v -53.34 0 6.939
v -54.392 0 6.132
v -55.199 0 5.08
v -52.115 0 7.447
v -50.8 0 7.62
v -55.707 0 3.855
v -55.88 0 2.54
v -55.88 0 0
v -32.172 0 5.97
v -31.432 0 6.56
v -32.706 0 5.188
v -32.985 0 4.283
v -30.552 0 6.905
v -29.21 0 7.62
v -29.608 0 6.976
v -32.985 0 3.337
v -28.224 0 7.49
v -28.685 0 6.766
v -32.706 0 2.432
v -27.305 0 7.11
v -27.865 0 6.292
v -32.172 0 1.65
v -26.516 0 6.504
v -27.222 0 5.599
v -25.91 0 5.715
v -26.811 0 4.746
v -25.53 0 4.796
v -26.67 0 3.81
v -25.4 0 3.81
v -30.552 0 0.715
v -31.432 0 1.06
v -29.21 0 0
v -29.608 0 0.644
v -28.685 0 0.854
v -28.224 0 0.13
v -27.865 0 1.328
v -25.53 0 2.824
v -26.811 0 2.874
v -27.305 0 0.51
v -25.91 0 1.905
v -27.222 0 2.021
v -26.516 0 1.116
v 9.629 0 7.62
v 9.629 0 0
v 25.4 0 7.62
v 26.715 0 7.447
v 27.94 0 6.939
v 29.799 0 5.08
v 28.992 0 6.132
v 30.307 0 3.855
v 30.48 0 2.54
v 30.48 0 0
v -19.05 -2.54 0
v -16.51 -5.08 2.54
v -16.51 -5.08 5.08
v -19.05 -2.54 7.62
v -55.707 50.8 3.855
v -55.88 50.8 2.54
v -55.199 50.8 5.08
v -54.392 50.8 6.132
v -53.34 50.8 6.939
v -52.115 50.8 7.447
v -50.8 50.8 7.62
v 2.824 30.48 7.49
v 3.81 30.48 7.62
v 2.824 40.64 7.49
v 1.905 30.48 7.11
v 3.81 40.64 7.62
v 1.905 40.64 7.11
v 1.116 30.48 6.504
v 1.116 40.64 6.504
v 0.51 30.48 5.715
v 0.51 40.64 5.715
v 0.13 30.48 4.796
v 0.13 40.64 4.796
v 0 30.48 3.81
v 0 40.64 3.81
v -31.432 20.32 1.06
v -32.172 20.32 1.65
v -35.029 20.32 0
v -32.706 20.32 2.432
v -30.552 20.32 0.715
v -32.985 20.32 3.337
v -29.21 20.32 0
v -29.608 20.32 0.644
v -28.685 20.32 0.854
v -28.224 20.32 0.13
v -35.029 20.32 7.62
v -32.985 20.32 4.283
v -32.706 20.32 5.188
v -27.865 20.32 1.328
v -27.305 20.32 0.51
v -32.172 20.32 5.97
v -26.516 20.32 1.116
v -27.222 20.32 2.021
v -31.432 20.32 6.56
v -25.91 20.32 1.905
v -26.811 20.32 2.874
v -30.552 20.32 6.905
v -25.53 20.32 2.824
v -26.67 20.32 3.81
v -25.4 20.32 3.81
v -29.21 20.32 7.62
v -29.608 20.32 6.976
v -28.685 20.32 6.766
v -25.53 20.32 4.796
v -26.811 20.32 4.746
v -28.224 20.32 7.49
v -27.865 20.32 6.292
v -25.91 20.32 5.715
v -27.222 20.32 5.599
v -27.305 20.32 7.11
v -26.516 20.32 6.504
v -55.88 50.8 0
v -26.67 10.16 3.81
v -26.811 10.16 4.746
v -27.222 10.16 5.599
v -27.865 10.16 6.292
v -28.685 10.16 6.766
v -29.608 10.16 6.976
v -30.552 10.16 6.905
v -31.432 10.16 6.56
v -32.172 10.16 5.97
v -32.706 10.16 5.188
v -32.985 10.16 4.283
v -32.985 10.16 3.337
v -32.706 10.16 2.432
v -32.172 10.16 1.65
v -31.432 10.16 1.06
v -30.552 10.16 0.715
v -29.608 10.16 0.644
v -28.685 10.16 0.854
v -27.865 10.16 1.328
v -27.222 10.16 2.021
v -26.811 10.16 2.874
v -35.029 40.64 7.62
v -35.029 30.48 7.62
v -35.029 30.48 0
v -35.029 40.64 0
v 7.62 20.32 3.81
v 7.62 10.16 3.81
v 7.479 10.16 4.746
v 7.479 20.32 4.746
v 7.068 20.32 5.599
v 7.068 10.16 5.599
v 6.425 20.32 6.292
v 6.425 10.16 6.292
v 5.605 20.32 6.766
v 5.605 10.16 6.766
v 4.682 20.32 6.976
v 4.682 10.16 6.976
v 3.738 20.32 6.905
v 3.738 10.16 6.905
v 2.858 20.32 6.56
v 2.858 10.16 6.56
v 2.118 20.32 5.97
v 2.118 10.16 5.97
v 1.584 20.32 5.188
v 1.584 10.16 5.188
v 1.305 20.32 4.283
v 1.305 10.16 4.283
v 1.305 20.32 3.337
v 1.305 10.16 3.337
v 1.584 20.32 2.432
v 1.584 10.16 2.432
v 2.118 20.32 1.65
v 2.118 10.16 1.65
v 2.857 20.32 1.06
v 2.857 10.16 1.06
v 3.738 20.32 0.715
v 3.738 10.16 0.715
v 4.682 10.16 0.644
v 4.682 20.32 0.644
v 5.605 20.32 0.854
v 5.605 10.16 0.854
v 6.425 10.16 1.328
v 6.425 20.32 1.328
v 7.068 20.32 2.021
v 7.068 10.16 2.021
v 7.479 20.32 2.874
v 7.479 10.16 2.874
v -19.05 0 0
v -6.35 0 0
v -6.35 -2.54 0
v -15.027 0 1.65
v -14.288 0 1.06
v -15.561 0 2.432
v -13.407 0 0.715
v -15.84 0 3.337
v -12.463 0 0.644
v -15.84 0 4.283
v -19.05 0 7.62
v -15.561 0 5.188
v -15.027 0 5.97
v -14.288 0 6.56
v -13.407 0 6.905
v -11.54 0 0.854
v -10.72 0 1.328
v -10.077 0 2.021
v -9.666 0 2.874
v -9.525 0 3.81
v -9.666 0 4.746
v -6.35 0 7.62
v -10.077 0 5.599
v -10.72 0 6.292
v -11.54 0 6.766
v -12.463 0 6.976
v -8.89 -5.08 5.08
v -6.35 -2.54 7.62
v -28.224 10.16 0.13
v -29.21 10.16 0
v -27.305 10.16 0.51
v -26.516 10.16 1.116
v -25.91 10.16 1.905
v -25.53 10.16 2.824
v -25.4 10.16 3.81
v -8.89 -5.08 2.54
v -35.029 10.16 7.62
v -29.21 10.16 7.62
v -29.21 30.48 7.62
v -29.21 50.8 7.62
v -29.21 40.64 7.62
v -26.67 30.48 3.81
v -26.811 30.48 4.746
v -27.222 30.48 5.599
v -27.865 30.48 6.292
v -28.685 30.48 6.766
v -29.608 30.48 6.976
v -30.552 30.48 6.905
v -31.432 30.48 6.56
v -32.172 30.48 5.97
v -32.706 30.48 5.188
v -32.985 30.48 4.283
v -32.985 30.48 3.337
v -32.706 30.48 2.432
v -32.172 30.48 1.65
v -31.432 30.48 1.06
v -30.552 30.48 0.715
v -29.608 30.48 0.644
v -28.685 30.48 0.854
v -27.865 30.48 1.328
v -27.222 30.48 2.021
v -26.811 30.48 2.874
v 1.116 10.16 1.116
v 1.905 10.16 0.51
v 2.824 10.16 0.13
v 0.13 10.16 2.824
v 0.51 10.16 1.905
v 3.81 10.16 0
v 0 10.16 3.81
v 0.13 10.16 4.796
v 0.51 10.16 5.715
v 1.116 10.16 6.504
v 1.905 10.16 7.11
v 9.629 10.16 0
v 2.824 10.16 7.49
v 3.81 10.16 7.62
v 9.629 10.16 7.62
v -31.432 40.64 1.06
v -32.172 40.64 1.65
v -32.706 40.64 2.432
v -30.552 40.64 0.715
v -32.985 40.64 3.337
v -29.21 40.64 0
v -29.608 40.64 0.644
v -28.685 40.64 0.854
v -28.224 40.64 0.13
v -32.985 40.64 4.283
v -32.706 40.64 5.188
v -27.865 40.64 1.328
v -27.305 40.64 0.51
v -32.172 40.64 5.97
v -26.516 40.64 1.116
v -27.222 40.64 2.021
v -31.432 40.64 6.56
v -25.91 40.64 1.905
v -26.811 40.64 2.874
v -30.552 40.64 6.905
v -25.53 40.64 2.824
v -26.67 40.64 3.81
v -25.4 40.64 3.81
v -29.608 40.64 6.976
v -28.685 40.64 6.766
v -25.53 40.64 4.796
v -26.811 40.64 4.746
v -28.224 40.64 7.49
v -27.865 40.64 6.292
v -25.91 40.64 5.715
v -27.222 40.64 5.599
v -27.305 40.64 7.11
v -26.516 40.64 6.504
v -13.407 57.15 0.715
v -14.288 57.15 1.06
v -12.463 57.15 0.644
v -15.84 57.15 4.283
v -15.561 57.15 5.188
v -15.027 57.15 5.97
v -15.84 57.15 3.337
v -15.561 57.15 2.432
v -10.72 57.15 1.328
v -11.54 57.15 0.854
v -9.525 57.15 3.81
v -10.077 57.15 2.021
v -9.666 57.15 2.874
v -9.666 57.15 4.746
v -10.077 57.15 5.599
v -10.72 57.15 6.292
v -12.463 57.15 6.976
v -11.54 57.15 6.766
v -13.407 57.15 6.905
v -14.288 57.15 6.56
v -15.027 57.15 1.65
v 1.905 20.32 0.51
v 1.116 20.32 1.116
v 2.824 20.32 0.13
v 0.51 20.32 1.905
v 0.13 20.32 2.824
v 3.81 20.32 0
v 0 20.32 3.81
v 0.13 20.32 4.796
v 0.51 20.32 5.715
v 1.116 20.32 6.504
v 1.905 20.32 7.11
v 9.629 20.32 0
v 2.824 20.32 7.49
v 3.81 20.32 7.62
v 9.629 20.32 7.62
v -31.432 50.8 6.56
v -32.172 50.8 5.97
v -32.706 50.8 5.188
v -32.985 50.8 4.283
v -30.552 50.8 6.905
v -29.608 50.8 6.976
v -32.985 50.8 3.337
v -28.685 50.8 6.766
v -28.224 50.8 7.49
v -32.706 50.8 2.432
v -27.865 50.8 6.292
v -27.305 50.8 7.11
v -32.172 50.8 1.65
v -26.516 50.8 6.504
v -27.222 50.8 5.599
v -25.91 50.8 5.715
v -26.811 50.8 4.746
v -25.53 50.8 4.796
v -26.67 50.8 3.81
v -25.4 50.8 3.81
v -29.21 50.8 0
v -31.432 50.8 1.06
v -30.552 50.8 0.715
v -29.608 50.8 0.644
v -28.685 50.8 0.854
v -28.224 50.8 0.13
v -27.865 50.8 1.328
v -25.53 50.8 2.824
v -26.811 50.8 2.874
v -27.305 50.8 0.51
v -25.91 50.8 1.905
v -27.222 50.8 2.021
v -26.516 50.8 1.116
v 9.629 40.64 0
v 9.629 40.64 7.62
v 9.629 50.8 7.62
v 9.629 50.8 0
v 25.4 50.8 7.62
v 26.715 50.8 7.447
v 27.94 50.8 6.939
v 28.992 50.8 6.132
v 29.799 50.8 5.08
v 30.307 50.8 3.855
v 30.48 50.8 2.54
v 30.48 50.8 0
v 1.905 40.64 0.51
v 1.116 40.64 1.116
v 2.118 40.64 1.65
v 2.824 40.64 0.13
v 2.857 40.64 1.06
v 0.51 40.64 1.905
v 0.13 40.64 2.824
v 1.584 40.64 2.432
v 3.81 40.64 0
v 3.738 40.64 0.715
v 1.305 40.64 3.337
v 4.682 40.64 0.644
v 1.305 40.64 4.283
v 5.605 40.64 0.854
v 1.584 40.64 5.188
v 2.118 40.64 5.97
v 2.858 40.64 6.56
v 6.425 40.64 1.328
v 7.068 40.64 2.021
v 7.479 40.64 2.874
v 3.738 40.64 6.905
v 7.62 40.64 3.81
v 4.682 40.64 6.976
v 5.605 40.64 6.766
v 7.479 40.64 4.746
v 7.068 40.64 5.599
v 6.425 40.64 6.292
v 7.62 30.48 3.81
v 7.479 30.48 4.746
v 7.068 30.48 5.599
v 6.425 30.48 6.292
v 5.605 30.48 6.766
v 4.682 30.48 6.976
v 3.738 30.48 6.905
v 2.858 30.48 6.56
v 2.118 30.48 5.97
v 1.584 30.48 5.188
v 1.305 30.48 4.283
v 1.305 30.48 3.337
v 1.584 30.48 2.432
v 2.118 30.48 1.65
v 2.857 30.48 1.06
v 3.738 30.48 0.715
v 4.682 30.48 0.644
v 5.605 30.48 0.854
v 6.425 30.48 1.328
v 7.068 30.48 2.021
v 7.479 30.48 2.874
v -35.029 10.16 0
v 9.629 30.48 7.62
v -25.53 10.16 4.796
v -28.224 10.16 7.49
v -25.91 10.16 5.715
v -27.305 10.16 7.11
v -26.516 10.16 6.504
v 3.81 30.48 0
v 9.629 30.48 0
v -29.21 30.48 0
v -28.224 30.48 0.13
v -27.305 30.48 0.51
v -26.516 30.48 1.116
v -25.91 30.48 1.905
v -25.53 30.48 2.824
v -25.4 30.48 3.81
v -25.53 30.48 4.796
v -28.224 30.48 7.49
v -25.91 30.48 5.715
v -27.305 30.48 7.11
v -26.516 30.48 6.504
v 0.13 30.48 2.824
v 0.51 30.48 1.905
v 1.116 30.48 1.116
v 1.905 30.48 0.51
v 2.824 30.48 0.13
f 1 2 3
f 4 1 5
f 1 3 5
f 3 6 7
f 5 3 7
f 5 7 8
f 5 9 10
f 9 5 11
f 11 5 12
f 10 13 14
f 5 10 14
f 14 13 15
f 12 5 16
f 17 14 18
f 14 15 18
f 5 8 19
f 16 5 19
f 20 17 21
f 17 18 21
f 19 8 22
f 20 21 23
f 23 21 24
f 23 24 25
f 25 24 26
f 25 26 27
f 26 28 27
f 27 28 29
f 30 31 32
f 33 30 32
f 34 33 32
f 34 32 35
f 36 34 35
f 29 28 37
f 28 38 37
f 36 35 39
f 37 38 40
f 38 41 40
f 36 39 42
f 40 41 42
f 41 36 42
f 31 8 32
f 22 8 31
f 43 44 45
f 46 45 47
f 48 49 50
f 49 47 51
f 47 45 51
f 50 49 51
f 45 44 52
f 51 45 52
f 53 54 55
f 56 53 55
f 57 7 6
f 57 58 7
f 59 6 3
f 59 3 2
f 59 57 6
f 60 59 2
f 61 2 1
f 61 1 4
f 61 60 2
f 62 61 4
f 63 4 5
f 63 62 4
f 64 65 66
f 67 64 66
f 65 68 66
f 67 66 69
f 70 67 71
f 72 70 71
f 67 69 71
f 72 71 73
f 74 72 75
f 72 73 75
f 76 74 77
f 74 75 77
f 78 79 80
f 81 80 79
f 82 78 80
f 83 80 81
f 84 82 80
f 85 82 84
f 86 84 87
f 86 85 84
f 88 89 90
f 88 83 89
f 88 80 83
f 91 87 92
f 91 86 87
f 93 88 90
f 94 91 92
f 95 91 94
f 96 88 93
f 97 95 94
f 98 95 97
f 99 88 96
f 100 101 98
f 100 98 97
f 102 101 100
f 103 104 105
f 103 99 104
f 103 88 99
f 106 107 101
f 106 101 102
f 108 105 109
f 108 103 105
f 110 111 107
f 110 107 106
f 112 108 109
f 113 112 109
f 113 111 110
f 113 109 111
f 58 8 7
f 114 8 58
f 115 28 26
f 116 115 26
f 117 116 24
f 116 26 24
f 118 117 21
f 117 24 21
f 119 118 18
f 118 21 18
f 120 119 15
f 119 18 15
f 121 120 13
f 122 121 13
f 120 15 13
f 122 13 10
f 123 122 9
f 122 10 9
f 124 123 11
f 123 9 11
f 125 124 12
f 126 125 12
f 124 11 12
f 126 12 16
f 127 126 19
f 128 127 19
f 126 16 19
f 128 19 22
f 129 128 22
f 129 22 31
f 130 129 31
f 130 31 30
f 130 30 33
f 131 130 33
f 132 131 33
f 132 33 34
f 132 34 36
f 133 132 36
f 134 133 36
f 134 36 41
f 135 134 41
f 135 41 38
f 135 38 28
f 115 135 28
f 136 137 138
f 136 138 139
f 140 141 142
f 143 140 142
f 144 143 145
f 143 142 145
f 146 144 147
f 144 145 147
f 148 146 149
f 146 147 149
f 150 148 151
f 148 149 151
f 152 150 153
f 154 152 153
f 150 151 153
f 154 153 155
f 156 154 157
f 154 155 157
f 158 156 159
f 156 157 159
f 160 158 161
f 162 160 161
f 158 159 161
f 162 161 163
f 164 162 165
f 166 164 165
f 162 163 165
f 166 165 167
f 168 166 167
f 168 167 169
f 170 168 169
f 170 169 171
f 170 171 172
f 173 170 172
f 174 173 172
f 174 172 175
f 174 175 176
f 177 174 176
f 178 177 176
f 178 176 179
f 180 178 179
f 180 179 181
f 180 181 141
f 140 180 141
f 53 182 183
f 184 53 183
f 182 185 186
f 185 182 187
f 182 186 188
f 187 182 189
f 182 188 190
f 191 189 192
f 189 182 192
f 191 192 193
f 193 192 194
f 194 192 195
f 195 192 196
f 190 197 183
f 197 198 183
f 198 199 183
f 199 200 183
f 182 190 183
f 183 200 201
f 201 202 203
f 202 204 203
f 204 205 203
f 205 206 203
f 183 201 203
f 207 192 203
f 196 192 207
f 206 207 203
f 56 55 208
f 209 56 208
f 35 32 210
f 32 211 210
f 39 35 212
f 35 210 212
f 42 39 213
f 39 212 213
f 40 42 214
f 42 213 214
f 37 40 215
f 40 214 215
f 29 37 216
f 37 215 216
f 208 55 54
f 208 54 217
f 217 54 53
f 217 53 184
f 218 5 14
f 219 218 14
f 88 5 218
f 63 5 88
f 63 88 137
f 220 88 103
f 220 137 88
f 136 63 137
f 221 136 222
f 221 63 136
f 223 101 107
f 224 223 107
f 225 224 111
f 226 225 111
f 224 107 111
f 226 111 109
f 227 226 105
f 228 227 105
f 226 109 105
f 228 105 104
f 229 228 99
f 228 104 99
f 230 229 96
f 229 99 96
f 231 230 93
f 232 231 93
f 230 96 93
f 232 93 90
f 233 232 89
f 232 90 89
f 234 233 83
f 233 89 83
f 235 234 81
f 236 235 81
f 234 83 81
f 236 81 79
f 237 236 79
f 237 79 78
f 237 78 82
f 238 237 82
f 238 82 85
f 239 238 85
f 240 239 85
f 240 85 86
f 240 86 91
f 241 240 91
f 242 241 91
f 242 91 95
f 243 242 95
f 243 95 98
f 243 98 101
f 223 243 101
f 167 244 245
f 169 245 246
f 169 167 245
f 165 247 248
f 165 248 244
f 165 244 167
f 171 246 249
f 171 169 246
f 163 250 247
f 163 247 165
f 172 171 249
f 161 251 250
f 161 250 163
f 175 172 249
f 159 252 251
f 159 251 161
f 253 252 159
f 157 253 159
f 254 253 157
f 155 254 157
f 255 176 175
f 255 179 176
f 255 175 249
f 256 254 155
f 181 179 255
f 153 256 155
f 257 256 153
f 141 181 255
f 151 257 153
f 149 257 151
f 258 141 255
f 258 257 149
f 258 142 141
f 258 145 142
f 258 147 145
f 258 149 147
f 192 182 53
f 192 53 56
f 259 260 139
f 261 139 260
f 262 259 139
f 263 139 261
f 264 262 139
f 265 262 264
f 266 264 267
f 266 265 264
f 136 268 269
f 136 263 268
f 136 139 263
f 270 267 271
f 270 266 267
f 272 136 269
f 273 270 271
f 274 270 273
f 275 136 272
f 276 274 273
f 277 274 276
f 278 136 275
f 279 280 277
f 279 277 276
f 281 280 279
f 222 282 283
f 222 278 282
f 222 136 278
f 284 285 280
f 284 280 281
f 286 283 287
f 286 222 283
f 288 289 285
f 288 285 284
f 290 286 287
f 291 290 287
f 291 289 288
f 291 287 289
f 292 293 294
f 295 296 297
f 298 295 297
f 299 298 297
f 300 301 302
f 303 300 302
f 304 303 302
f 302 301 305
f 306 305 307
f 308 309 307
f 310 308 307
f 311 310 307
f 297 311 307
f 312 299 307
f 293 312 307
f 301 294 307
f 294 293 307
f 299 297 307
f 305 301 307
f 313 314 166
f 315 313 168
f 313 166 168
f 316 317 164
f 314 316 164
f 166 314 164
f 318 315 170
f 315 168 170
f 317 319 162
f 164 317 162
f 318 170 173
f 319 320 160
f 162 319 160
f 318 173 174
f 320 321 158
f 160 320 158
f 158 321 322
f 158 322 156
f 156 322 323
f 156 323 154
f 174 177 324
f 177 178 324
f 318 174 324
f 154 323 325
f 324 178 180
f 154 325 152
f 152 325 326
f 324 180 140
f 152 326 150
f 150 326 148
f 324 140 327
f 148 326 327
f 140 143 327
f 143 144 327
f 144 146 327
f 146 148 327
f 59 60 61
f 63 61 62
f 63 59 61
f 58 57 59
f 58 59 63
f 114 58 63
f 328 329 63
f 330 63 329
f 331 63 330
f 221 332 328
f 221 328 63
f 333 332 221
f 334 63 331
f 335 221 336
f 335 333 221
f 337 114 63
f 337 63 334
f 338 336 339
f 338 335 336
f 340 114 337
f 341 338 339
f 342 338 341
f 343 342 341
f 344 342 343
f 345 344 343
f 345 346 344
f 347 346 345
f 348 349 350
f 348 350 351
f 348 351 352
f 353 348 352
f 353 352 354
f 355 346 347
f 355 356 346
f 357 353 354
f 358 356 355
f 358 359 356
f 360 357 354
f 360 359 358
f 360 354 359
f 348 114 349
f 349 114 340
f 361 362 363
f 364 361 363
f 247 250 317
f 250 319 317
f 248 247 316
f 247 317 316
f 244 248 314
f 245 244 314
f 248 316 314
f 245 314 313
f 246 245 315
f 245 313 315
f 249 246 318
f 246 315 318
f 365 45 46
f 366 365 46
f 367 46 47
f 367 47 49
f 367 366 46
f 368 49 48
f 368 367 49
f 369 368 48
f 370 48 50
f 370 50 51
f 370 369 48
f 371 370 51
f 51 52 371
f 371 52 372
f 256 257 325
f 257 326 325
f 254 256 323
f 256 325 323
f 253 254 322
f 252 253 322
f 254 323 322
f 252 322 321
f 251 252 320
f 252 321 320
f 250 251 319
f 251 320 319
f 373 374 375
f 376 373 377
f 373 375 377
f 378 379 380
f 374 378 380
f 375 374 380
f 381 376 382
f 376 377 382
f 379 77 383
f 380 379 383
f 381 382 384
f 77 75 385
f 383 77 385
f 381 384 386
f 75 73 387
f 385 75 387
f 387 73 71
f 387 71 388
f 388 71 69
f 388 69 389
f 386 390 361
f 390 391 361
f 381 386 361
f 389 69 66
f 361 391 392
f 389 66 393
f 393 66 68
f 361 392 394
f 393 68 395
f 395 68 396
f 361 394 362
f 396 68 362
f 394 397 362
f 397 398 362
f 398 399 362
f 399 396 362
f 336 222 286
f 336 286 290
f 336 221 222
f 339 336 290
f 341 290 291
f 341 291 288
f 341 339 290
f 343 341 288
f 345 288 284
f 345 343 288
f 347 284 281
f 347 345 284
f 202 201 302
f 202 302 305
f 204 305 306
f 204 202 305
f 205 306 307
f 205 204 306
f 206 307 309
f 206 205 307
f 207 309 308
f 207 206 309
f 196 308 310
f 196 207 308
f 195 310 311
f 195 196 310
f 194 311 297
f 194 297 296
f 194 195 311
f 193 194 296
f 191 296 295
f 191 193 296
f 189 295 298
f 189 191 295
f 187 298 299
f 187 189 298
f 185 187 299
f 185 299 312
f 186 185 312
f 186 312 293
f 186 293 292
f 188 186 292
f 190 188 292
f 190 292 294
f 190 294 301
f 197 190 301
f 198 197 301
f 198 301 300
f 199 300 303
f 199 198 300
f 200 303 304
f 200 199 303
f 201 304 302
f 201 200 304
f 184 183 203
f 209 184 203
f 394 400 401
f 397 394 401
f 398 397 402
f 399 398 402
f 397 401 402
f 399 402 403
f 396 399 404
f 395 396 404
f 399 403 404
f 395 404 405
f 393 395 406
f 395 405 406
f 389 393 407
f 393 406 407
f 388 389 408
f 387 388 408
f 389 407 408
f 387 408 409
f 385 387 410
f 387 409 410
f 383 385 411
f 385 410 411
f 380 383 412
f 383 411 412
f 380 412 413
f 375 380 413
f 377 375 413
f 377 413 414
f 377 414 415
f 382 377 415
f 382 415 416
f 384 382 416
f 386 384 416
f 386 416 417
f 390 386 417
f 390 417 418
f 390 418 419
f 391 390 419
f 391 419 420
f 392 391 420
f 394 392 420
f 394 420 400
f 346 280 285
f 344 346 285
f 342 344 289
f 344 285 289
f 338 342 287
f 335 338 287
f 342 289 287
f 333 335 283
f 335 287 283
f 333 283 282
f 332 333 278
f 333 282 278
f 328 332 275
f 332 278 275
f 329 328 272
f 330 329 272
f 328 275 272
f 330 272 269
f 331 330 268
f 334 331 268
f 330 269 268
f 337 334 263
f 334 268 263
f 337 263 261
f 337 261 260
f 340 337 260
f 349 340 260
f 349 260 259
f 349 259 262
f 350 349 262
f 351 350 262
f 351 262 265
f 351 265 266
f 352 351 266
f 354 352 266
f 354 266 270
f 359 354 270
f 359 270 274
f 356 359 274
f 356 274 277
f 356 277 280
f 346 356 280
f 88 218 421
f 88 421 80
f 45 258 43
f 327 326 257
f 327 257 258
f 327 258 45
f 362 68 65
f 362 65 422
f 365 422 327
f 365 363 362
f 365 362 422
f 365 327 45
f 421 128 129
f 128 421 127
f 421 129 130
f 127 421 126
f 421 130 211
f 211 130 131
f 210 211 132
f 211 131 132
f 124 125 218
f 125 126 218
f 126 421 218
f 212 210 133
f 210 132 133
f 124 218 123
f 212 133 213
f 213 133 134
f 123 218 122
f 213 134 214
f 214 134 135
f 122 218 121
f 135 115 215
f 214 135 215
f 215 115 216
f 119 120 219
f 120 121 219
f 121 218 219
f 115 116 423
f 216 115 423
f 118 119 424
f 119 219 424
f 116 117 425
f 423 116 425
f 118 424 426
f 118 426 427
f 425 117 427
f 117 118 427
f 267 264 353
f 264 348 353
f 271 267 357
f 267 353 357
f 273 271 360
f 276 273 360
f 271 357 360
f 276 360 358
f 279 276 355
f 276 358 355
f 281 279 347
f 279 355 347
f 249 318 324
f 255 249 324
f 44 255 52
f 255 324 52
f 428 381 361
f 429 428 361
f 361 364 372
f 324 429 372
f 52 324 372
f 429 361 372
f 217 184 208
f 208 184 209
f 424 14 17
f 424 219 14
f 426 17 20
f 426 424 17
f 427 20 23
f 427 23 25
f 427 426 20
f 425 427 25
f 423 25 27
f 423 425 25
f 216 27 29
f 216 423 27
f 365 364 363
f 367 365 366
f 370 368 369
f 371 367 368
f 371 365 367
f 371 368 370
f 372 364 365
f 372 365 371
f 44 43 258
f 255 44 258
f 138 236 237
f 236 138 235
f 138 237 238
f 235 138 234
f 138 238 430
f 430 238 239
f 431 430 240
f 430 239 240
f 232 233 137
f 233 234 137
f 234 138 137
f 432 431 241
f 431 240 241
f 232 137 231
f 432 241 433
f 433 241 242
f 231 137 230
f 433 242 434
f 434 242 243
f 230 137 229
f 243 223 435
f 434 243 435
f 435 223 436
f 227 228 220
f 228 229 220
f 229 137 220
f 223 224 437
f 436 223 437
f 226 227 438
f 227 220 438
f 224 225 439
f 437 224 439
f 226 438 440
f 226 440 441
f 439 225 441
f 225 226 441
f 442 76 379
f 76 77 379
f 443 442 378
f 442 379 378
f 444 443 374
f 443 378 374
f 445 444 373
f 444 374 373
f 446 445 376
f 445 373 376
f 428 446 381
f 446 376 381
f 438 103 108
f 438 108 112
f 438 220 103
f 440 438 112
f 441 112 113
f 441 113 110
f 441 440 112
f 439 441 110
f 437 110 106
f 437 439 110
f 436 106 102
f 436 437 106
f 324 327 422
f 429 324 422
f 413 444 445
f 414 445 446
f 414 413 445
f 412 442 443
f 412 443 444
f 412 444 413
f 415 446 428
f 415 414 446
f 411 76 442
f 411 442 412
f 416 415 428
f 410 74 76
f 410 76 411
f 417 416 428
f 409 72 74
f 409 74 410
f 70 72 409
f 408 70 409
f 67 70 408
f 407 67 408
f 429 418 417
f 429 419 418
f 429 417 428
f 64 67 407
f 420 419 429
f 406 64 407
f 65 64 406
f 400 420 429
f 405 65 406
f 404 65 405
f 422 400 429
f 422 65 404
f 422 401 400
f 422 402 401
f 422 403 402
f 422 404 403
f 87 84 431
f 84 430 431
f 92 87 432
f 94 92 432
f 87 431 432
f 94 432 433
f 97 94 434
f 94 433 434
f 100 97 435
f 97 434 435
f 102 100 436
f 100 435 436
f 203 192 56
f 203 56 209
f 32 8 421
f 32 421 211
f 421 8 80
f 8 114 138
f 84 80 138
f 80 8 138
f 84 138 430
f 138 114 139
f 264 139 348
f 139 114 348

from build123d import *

# Parameters (mm, degrees)
F0_W      = 30.48
F0_H      = 50.8
F1_DEPTH  = 7.62
F2_R      = 3.175
F3_DEPTH  = 50.8
F4_W      = 9.6290465444
F4_H      = 10.16
F5_DEPTH  = 7.62
F6_DEPTH  = 7.62
F7_R      = 5.08
F7_2_R    = 5.08
F8_R      = 3.80999
F8_2_R    = 3.80999
F9_W      = 12.7
F9_H      = 7.62
F9_R      = 3.175
F10_DEPTH = 5.08
F11_DEPTH = 57.15
F12_SIZE  = 2.54


# Not quite as in the source:
# - a fillet or chamfer is up to 0.001 mm smaller than in the source, because OpenCascade refuses the exact size


with BuildPart() as f1:
    # F0 (on Top) → F1 (new body)
    with BuildSketch(Plane.XY):
        with Locations((15.24, 25.4)):
            Rectangle(F0_W, F0_H)
    extrude(amount=F1_DEPTH)


with BuildPart() as f1b:
    # F0 (on Top) → F1, piece 2 (new body)
    with BuildSketch(Plane.XY):
        with Locations((-40.64, 25.4)):
            Rectangle(F0_W, F0_H)
    extrude(amount=F1_DEPTH)


with BuildPart() as f3_tool:
    # F2 (on face) → F3 (new body, through all)
    with BuildSketch(Plane.XZ):
        with Locations((4.445, 3.81)):
            Circle(F2_R)
        with Locations((-29.845, 3.81)):
            Circle(F2_R)
    extrude(amount=-F3_DEPTH)


with BuildPart() as f1_1:
    add(f1.part)

    # F3: cut by f3_tool
    add(f3_tool.part, mode=Mode.SUBTRACT)

    # F4 (on face) → F5 (cut, through all)
    with BuildSketch(Plane.XY.offset(7.62)):
        with Locations((4.8145232722, 5.08)):
            Rectangle(F4_W, F4_H)
        with Locations((4.8145232722, 25.4)):
            Rectangle(F4_W, F4_H)
        with Locations((4.8145232722, 45.72)):
            Rectangle(F4_W, F4_H)
    extrude(amount=-F5_DEPTH, mode=Mode.SUBTRACT)

    # F7#2
    f7_2_edges = [f1_1.edges().sort_by_distance(p)[0] for p in [
        (30.48, 25.4, 7.62),
    ]]
    fillet(f7_2_edges, radius=F7_2_R)

    # F8 (radius 3.81 in the source; OpenCascade refuses exactly that, so slightly less here)
    f8_edges = [f1_1.edges().sort_by_distance(p)[0] for p in [
        (0, 15.24, 7.62),
        (0, 15.24, 0),
        (0, 35.56, 7.62),
        (0, 35.56, 0),
    ]]
    fillet(f8_edges, radius=F8_R)


with BuildPart() as f1b_1:
    add(f1b.part)

    # F3: cut by f3_tool
    add(f3_tool.part, mode=Mode.SUBTRACT)

    # F4 (on face) → F6 (cut, through all)
    with BuildSketch(Plane.XY.offset(7.62)):
        with Locations((-30.2145232722, 15.24)):
            Rectangle(F4_W, F4_H)
        with Locations((-30.2145232722, 35.56)):
            Rectangle(F4_W, F4_H)
    extrude(amount=-F6_DEPTH, mode=Mode.SUBTRACT)

    # F7
    f7_edges = [f1b_1.edges().sort_by_distance(p)[0] for p in [
        (-55.88, 25.4, 7.62),
    ]]
    fillet(f7_edges, radius=F7_R)

    # F8#2 (radius 3.81 in the source; OpenCascade refuses exactly that, so slightly less here)
    f8_2_edges = [f1b_1.edges().sort_by_distance(p)[0] for p in [
        (-25.4, 5.08, 0),
        (-25.4, 5.08, 7.62),
        (-25.4, 25.4, 0),
        (-25.4, 25.4, 7.62),
        (-25.4, 45.72, 0),
        (-25.4, 45.72, 7.62),
    ]]
    fillet(f8_2_edges, radius=F8_2_R)


with BuildPart() as f10:
    # F9 (on face) → F10 (new body)
    with BuildSketch(Plane.XZ):
        with Locations((-12.7, 3.81)):
            Rectangle(F9_W, F9_H)
        with Locations((-12.7, 3.81)):
            Circle(F9_R, mode=Mode.SUBTRACT)
        with Locations((-12.7, 3.81)):
            Circle(F9_R)
    extrude(amount=F10_DEPTH)

    # F9 (on face) → F11 (join)
    with BuildSketch(Plane.XZ):
        with Locations((-12.7, 3.81)):
            Circle(F9_R)
    extrude(amount=-F11_DEPTH)

    # F12
    f12_edges = [f10.edges().sort_by_distance(p)[0] for p in [
        (-6.35, -5.08, 3.81),
        (-12.7, -5.08, 7.62),
        (-19.05, -5.08, 3.81),
        (-12.7, -5.08, 0),
    ]]
    chamfer(f12_edges, length=F12_SIZE)


solid = Compound([f1_1.part, f1b_1.part, f10.part])
